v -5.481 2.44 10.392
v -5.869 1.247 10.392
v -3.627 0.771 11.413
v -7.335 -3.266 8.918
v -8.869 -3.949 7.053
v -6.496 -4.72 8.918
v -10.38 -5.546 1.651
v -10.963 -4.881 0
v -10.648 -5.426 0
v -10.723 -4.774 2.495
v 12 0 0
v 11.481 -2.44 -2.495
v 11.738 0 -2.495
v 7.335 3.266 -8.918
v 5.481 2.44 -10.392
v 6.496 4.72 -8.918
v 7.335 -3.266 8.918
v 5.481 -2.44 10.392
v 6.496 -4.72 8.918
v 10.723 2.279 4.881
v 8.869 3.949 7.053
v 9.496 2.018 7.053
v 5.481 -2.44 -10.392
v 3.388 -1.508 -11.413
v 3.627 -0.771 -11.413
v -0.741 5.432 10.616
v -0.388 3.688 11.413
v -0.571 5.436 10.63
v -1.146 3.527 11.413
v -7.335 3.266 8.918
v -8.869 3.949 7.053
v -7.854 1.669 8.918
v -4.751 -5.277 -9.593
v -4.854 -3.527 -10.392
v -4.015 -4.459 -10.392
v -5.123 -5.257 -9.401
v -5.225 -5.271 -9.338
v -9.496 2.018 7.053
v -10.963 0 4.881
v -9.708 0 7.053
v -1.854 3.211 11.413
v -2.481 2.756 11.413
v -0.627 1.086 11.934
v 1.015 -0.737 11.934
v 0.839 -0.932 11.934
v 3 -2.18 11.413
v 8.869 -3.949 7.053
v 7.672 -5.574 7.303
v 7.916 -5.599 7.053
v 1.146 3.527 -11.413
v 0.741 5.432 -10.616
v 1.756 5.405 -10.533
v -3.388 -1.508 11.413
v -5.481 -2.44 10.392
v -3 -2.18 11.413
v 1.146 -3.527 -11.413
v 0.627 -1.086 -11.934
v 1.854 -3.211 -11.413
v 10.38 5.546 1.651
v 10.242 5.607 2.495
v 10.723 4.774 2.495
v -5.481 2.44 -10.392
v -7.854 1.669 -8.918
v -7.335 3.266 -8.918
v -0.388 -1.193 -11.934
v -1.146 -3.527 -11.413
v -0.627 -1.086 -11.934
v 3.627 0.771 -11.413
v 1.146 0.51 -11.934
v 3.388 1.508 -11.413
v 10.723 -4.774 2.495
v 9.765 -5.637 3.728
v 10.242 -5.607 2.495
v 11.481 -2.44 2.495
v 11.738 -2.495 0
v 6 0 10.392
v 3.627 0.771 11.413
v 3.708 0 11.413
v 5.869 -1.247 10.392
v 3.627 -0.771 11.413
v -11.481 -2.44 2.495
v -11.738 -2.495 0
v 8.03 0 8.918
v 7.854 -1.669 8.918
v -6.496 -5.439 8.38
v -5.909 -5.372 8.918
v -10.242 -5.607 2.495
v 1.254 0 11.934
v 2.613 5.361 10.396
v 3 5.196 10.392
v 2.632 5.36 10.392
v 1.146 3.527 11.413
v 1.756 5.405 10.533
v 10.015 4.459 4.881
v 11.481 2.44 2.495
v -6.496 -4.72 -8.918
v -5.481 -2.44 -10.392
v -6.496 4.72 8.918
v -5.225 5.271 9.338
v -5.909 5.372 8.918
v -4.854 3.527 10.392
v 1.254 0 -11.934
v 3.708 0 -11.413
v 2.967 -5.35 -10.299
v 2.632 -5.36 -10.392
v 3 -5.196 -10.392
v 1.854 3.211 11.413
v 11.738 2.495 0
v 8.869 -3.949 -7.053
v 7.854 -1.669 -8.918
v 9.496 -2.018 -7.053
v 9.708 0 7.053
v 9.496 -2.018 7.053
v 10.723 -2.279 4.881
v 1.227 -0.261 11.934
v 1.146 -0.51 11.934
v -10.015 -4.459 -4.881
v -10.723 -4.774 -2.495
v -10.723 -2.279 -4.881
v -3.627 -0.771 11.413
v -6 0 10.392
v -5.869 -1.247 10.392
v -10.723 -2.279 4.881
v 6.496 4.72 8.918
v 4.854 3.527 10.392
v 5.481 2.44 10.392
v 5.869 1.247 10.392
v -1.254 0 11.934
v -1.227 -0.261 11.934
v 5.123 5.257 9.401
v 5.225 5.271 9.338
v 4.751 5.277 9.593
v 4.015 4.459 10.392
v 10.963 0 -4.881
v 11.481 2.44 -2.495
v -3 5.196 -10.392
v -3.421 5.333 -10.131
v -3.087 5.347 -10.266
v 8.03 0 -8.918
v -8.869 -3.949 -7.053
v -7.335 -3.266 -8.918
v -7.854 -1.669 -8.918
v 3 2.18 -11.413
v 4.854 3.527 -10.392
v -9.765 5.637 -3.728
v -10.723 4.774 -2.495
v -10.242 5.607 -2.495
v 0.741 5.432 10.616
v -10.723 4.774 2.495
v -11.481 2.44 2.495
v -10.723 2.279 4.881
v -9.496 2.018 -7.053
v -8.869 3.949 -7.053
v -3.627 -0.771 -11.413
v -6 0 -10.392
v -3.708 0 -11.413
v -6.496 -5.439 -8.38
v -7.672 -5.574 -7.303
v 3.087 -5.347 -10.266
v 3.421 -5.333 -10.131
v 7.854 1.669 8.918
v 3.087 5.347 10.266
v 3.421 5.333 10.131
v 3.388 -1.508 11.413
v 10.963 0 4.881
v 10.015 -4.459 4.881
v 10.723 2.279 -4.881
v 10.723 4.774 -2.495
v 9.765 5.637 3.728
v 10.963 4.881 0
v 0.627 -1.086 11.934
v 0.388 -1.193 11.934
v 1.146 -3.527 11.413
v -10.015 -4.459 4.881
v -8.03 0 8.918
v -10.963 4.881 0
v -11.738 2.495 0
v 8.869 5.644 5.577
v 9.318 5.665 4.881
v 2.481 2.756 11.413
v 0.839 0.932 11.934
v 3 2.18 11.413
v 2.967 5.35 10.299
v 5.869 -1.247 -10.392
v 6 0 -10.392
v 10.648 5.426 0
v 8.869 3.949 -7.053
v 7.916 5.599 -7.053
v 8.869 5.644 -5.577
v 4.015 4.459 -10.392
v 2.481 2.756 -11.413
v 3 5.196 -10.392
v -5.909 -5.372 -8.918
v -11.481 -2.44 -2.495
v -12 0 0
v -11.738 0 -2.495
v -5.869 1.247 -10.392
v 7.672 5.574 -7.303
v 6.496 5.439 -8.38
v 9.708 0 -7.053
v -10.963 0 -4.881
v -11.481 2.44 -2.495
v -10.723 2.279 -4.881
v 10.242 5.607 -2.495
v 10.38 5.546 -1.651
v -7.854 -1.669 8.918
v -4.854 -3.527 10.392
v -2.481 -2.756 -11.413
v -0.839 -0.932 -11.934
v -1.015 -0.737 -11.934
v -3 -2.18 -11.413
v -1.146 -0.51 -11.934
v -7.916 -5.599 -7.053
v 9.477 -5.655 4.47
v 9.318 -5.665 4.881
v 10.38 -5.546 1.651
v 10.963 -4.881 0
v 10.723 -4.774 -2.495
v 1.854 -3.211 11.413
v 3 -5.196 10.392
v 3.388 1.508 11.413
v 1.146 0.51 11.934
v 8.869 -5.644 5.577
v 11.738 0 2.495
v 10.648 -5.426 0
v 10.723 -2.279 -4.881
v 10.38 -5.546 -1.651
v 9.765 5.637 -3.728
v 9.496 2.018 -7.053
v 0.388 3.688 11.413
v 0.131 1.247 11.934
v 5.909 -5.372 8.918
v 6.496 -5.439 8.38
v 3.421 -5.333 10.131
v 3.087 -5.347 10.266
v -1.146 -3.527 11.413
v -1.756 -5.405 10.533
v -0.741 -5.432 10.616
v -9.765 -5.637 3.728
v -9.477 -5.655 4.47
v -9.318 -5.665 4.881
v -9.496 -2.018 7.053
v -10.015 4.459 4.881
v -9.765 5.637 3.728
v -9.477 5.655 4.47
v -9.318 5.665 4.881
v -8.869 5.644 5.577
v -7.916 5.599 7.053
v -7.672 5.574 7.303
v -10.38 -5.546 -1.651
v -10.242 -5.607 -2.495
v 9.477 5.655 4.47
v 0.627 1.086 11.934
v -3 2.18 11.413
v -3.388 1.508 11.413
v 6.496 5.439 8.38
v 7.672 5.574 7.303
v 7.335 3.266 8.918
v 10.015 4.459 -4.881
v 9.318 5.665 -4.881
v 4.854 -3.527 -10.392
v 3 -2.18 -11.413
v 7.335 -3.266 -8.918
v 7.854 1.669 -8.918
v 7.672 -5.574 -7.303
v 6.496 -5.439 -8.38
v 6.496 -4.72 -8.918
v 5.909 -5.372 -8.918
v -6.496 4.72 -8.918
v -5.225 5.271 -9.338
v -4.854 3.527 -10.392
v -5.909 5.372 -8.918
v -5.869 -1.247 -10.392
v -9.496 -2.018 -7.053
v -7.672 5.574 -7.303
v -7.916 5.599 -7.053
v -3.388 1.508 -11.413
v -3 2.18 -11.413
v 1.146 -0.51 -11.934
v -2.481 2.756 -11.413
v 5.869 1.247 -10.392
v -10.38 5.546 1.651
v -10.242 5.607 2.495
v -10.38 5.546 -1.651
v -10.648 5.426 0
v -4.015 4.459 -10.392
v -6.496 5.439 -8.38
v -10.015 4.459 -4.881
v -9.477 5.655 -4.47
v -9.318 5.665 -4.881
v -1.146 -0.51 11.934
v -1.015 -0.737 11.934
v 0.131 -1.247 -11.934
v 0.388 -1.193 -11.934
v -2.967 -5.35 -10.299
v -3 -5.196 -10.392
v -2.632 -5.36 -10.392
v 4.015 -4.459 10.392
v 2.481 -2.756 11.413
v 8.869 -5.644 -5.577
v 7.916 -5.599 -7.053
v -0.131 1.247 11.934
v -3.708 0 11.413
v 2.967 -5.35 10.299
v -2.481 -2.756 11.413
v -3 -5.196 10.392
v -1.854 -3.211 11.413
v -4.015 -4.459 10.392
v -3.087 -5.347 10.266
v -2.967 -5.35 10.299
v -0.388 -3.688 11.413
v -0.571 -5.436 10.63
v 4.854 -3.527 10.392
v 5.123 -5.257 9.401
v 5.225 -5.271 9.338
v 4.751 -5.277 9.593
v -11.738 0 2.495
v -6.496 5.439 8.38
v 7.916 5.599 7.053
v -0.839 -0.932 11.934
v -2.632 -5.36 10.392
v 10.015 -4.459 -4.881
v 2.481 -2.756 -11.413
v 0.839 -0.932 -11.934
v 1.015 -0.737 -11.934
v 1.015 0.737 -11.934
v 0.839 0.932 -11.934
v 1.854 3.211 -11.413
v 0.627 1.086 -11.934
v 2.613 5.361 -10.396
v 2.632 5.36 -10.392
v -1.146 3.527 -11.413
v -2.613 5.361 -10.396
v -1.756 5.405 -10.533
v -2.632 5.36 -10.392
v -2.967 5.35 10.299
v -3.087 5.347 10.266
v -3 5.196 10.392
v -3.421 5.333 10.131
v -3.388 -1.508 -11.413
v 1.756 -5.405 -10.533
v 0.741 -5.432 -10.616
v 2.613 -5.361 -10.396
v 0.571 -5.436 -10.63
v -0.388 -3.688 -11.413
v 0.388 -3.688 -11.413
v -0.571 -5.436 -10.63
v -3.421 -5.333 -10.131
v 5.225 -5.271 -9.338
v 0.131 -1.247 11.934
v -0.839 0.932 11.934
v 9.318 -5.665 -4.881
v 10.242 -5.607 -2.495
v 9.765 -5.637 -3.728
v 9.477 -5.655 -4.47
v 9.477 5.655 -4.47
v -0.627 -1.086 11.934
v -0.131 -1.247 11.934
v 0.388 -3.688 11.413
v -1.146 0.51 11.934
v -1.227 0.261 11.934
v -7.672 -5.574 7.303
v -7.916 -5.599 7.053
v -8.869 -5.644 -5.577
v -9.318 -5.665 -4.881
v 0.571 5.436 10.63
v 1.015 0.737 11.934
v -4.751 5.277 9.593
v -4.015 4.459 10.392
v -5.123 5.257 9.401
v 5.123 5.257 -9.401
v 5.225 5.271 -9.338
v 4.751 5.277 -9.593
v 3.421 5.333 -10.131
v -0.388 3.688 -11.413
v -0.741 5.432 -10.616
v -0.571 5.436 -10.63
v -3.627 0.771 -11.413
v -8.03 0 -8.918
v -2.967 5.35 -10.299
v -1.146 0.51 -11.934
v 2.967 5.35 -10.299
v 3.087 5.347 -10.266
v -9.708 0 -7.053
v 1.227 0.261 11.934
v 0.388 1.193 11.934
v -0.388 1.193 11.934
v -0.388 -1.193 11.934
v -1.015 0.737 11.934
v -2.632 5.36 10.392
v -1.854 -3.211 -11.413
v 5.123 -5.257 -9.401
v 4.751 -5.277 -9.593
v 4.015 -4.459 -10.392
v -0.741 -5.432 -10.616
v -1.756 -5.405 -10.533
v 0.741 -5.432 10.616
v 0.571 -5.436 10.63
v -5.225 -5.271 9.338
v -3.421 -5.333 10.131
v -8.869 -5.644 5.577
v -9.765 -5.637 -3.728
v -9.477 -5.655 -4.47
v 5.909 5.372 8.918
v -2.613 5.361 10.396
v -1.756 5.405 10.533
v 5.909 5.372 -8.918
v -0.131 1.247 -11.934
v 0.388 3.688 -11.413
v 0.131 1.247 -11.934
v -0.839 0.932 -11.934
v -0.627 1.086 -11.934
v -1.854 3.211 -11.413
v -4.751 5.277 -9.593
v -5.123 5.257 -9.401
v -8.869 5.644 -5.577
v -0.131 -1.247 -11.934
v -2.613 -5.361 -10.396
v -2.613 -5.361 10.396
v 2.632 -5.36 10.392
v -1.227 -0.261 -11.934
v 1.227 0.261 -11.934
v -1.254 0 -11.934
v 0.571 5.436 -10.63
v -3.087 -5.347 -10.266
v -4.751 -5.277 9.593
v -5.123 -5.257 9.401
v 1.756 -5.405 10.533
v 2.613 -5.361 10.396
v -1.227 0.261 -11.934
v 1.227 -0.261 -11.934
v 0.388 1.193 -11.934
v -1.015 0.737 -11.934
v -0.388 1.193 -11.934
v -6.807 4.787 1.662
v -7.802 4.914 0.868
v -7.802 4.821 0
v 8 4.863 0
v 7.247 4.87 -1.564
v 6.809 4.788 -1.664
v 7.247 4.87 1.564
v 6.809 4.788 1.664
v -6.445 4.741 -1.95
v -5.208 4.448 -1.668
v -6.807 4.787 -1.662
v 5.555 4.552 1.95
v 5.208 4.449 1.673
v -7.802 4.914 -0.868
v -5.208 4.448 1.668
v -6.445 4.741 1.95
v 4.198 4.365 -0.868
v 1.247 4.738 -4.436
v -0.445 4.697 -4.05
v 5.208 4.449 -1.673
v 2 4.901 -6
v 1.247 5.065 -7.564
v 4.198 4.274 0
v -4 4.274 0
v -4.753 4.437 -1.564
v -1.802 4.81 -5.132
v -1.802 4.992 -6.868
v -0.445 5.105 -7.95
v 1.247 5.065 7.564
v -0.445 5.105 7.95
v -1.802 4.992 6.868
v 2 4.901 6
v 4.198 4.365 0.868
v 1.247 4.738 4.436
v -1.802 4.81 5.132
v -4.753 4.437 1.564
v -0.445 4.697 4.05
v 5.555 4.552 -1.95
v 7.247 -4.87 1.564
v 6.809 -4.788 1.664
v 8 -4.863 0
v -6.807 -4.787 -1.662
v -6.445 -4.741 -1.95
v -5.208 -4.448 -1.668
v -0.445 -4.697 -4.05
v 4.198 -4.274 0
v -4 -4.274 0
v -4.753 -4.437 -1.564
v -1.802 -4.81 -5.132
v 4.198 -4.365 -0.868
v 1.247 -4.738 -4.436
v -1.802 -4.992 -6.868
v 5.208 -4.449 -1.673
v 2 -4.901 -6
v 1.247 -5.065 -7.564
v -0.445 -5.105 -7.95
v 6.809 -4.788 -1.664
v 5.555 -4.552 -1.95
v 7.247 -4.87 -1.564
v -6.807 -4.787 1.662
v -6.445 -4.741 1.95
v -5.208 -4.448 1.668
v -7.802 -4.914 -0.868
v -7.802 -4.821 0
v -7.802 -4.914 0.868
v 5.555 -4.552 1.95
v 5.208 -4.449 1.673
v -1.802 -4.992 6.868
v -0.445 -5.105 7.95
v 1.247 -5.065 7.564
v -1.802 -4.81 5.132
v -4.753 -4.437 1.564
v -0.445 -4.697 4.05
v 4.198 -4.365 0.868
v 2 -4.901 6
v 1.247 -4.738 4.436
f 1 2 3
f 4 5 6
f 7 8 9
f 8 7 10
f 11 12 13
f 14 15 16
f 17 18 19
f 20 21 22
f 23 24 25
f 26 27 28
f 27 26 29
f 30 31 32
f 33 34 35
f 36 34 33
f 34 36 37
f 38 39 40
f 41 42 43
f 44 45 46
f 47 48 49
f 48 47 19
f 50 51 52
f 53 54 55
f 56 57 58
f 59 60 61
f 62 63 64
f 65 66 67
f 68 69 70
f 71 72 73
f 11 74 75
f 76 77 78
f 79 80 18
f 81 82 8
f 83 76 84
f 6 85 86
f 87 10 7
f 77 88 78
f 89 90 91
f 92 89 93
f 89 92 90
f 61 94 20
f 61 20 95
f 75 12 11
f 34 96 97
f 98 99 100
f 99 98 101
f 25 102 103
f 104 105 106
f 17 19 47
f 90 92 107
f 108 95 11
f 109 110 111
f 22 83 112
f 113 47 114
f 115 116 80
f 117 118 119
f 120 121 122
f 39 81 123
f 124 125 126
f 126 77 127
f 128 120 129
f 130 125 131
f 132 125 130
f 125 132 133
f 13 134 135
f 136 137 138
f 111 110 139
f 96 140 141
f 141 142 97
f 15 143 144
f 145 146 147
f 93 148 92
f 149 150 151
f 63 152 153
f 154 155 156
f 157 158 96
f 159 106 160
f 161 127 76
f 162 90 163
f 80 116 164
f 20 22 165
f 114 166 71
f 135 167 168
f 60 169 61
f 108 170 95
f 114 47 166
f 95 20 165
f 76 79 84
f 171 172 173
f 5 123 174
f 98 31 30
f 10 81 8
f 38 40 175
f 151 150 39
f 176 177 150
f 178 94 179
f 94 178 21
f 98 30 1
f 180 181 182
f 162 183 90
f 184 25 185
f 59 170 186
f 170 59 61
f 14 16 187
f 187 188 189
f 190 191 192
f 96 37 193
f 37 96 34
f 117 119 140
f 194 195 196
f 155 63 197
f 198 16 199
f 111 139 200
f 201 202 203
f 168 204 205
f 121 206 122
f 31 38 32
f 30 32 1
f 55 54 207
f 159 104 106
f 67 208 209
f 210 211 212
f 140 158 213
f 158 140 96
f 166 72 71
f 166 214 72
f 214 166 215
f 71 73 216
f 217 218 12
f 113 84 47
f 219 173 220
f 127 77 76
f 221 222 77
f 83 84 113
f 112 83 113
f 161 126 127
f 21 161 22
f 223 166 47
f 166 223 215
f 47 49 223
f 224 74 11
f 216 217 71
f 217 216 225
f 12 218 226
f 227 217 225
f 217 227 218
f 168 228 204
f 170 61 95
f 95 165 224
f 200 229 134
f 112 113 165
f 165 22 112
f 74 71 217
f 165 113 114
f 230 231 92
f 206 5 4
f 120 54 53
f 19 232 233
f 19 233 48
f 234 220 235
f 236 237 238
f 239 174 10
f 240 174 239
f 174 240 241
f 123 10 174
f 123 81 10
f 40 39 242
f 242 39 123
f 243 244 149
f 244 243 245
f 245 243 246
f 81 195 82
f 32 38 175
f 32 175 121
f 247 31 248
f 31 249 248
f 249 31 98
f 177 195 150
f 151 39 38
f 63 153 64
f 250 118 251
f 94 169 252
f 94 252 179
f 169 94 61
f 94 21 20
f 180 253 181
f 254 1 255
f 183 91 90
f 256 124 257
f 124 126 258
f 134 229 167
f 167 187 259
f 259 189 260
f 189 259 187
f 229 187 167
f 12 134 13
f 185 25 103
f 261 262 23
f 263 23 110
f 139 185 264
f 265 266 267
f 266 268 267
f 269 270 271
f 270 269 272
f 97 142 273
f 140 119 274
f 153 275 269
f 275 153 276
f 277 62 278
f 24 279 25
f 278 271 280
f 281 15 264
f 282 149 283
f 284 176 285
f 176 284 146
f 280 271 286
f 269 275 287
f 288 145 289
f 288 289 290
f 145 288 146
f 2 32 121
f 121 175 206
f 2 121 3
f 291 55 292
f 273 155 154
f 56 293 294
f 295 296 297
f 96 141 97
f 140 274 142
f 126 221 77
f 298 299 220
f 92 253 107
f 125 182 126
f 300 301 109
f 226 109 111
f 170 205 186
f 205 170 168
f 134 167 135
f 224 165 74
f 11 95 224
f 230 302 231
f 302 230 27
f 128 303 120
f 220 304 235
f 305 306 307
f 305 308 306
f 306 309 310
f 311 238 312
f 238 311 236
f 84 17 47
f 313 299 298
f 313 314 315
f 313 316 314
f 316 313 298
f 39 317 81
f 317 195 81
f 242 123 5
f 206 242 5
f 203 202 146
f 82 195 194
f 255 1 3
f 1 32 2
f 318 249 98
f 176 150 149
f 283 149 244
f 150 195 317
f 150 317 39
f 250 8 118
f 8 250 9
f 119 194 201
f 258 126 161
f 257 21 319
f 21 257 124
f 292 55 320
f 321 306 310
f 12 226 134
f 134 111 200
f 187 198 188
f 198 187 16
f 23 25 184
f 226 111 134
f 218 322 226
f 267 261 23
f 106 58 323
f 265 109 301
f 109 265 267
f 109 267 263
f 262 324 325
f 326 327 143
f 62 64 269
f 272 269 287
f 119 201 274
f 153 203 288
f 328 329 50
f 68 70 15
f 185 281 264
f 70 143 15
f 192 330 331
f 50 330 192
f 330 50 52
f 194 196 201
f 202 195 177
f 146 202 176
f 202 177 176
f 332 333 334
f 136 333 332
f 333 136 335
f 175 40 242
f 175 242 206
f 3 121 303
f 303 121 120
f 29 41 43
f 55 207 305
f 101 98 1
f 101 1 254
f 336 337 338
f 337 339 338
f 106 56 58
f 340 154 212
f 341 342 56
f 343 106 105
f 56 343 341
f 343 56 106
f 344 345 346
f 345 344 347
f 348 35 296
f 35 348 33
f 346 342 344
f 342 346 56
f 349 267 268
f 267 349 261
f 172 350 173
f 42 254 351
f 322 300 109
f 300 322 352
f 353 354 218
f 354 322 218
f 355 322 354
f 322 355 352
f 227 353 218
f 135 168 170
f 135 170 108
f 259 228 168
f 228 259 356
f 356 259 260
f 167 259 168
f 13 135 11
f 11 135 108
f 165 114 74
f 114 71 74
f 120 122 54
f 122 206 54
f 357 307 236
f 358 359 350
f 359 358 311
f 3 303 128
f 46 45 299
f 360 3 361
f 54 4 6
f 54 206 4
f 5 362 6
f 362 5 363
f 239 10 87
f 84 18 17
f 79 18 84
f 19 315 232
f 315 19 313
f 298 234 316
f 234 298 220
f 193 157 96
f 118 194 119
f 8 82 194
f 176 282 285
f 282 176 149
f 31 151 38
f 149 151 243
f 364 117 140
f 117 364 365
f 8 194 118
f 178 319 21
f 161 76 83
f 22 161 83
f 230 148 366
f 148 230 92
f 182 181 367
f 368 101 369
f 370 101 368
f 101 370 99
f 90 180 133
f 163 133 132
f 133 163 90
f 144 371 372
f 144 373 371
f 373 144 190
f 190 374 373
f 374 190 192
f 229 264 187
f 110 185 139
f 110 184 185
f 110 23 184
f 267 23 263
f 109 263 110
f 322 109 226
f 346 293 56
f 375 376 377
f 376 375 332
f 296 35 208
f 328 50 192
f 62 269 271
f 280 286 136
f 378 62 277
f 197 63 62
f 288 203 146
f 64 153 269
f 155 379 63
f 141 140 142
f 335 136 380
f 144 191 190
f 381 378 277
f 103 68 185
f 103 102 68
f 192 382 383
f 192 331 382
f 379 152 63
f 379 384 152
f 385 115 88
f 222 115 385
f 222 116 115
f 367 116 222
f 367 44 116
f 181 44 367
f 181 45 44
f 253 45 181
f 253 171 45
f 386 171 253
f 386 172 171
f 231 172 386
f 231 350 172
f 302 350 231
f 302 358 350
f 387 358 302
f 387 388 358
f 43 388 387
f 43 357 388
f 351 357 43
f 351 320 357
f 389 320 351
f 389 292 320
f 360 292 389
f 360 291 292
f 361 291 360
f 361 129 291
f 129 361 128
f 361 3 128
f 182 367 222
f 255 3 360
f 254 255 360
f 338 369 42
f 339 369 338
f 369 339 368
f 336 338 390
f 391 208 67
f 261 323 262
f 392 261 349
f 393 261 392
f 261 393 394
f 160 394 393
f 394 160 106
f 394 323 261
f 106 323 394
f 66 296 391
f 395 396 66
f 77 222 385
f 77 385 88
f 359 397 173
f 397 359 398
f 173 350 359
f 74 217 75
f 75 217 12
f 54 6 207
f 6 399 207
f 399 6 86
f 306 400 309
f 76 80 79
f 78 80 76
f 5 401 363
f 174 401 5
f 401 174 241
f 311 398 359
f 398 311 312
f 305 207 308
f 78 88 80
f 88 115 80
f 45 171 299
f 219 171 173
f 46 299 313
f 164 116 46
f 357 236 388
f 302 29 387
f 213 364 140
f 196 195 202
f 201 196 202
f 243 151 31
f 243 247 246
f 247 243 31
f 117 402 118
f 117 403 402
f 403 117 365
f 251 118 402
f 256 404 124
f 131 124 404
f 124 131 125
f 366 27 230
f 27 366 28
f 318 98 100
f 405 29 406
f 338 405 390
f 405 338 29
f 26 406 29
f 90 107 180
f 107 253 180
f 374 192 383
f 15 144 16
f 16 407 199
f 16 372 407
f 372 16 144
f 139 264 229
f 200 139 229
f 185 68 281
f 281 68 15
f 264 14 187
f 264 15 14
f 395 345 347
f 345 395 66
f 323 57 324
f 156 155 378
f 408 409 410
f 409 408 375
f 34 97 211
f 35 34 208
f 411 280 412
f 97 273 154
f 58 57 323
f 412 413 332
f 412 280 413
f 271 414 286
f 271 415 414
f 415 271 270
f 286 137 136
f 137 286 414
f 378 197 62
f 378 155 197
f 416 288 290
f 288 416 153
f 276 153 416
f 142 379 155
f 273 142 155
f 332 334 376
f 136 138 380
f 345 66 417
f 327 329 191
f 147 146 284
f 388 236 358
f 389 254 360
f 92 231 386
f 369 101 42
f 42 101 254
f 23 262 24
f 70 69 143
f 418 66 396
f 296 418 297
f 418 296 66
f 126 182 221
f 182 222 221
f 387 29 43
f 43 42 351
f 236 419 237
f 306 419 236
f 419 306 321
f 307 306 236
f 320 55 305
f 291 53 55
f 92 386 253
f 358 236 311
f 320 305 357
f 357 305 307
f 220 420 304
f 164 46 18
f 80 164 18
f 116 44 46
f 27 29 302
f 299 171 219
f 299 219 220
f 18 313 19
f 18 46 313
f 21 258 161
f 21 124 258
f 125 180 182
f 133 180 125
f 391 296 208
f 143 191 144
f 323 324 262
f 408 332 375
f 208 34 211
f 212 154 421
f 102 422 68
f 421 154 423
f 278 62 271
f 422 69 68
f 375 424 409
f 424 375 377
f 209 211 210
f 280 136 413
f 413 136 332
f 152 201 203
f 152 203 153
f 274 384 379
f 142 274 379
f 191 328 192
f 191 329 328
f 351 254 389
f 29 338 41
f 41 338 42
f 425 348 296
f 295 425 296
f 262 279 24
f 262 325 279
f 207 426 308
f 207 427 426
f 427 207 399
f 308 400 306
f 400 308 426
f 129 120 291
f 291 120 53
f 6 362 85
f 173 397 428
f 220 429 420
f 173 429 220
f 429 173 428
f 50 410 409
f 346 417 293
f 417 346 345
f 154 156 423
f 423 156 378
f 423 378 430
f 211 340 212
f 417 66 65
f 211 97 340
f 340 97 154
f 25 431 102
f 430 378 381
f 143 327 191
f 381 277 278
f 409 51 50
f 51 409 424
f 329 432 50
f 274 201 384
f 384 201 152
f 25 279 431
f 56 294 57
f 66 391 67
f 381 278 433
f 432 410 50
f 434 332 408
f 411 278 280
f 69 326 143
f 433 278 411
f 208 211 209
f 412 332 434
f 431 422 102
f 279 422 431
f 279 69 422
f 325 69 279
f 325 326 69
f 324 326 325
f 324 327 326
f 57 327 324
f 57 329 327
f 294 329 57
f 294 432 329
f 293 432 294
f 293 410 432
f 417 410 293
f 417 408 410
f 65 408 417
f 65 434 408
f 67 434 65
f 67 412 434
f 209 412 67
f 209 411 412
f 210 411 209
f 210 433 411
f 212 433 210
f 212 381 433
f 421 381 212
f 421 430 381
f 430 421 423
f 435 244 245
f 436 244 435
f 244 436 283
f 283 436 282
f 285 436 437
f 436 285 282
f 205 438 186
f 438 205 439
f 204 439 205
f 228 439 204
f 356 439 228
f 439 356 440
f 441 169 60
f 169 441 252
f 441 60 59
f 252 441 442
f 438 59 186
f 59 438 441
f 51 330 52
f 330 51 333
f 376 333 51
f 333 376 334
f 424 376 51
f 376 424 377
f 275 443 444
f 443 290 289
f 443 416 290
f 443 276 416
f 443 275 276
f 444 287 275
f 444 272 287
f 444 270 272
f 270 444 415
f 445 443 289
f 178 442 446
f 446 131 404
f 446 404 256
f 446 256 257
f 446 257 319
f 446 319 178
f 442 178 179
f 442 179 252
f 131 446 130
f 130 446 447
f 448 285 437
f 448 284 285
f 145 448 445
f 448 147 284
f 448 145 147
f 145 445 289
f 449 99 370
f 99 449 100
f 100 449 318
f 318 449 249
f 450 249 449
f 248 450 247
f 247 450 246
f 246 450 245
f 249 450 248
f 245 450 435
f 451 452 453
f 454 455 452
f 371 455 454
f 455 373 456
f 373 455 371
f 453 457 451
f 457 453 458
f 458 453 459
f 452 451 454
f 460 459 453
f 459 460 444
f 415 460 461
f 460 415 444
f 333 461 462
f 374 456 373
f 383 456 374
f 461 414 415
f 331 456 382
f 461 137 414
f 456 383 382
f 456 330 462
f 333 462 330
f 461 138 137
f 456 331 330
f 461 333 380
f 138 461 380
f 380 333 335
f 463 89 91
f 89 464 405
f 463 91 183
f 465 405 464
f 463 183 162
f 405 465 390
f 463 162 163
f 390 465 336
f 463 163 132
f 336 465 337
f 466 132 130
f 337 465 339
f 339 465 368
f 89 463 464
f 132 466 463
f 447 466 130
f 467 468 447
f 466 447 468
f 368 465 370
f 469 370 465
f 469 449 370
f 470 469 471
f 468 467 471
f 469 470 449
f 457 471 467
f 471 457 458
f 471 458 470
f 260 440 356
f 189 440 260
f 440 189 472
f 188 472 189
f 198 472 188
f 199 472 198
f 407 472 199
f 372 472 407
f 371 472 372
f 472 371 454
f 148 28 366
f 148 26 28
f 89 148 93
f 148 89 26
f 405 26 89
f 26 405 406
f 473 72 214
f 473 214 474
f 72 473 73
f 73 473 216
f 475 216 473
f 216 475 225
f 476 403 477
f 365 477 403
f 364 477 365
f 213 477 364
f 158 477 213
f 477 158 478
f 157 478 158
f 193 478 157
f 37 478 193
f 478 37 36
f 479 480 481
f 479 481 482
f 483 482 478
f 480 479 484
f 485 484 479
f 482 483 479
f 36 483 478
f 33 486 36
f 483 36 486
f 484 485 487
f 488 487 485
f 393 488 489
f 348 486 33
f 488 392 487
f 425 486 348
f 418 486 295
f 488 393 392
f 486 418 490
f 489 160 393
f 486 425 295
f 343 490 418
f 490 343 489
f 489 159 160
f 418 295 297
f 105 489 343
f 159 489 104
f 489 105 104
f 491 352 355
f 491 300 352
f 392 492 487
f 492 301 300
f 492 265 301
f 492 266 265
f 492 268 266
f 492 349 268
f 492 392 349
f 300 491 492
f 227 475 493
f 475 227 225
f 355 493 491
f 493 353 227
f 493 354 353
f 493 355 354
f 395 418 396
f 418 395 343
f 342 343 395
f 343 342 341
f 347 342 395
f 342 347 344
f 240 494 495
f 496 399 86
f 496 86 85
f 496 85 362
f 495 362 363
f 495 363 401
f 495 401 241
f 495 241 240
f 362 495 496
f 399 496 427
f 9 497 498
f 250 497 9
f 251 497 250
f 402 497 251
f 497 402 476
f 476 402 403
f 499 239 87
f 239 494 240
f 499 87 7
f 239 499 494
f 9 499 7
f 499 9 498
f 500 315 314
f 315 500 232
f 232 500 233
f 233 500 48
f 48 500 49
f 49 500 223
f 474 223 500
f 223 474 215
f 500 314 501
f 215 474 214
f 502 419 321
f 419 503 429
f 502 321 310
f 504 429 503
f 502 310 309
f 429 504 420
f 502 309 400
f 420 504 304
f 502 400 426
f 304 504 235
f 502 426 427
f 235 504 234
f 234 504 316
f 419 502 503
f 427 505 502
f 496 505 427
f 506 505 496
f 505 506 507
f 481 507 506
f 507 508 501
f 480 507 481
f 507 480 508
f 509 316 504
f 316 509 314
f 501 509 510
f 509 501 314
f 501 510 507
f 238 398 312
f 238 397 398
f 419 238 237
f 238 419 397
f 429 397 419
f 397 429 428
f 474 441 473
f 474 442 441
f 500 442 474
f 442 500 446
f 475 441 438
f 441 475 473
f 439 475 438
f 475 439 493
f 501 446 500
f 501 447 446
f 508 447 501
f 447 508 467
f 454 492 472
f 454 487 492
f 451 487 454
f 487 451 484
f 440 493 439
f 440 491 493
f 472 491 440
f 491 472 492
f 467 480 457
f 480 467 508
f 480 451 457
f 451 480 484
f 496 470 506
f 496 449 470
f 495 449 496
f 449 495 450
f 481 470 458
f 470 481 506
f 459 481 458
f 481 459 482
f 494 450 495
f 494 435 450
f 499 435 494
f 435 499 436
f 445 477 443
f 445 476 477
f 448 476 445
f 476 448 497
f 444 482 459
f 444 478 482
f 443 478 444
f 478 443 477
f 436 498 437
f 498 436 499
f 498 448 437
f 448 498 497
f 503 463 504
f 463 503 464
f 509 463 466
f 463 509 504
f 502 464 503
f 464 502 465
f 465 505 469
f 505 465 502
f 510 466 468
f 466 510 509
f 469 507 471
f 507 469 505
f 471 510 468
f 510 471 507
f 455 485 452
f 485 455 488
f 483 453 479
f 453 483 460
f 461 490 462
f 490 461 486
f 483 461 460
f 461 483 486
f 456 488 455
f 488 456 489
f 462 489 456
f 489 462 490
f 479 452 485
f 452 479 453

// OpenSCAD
module wheel(wheel_radius=10, side_spheres_radius=50, hub_thickness=4, cylinder_radius=2) {
    cylinder_height=wheel_radius*2;
    difference() {
        //wheel sphere
        sphere(r=wheel_radius);
        //side sphere 1
        translate([0,side_spheres_radius+hub_thickness/2,0])
            sphere(r=side_spheres_radius);
        //side sphere 2
        translate([0,-(side_spheres_radius+hub_thickness/2),0])
            sphere(r=side_spheres_radius);
        //cylinder 1
        translate([wheel_radius/2,0,0])
            rotate([90,0,0])
            cylinder(h=cylinder_height,r=cylinder_radius,center=true);
        //cylinder 2
        translate([-wheel_radius/2,0,0])
            rotate([90,0,0])
            cylinder(h=cylinder_height,r=cylinder_radius,center=true);
        //cylinder 3
        translate([0,0,wheel_radius/2])
            rotate([90,0,0])
            cylinder(h=cylinder_height,r=cylinder_radius,center=true);
        //cylinder 4
        translate([0,0,-wheel_radius/2])
            rotate([90,0,0])
            cylinder(h=cylinder_height,r=cylinder_radius,center=true);
    }
}
//wheel();
//wheel(hub_thickness=8);
wheel(hub_thickness=8, wheel_radius=12);
